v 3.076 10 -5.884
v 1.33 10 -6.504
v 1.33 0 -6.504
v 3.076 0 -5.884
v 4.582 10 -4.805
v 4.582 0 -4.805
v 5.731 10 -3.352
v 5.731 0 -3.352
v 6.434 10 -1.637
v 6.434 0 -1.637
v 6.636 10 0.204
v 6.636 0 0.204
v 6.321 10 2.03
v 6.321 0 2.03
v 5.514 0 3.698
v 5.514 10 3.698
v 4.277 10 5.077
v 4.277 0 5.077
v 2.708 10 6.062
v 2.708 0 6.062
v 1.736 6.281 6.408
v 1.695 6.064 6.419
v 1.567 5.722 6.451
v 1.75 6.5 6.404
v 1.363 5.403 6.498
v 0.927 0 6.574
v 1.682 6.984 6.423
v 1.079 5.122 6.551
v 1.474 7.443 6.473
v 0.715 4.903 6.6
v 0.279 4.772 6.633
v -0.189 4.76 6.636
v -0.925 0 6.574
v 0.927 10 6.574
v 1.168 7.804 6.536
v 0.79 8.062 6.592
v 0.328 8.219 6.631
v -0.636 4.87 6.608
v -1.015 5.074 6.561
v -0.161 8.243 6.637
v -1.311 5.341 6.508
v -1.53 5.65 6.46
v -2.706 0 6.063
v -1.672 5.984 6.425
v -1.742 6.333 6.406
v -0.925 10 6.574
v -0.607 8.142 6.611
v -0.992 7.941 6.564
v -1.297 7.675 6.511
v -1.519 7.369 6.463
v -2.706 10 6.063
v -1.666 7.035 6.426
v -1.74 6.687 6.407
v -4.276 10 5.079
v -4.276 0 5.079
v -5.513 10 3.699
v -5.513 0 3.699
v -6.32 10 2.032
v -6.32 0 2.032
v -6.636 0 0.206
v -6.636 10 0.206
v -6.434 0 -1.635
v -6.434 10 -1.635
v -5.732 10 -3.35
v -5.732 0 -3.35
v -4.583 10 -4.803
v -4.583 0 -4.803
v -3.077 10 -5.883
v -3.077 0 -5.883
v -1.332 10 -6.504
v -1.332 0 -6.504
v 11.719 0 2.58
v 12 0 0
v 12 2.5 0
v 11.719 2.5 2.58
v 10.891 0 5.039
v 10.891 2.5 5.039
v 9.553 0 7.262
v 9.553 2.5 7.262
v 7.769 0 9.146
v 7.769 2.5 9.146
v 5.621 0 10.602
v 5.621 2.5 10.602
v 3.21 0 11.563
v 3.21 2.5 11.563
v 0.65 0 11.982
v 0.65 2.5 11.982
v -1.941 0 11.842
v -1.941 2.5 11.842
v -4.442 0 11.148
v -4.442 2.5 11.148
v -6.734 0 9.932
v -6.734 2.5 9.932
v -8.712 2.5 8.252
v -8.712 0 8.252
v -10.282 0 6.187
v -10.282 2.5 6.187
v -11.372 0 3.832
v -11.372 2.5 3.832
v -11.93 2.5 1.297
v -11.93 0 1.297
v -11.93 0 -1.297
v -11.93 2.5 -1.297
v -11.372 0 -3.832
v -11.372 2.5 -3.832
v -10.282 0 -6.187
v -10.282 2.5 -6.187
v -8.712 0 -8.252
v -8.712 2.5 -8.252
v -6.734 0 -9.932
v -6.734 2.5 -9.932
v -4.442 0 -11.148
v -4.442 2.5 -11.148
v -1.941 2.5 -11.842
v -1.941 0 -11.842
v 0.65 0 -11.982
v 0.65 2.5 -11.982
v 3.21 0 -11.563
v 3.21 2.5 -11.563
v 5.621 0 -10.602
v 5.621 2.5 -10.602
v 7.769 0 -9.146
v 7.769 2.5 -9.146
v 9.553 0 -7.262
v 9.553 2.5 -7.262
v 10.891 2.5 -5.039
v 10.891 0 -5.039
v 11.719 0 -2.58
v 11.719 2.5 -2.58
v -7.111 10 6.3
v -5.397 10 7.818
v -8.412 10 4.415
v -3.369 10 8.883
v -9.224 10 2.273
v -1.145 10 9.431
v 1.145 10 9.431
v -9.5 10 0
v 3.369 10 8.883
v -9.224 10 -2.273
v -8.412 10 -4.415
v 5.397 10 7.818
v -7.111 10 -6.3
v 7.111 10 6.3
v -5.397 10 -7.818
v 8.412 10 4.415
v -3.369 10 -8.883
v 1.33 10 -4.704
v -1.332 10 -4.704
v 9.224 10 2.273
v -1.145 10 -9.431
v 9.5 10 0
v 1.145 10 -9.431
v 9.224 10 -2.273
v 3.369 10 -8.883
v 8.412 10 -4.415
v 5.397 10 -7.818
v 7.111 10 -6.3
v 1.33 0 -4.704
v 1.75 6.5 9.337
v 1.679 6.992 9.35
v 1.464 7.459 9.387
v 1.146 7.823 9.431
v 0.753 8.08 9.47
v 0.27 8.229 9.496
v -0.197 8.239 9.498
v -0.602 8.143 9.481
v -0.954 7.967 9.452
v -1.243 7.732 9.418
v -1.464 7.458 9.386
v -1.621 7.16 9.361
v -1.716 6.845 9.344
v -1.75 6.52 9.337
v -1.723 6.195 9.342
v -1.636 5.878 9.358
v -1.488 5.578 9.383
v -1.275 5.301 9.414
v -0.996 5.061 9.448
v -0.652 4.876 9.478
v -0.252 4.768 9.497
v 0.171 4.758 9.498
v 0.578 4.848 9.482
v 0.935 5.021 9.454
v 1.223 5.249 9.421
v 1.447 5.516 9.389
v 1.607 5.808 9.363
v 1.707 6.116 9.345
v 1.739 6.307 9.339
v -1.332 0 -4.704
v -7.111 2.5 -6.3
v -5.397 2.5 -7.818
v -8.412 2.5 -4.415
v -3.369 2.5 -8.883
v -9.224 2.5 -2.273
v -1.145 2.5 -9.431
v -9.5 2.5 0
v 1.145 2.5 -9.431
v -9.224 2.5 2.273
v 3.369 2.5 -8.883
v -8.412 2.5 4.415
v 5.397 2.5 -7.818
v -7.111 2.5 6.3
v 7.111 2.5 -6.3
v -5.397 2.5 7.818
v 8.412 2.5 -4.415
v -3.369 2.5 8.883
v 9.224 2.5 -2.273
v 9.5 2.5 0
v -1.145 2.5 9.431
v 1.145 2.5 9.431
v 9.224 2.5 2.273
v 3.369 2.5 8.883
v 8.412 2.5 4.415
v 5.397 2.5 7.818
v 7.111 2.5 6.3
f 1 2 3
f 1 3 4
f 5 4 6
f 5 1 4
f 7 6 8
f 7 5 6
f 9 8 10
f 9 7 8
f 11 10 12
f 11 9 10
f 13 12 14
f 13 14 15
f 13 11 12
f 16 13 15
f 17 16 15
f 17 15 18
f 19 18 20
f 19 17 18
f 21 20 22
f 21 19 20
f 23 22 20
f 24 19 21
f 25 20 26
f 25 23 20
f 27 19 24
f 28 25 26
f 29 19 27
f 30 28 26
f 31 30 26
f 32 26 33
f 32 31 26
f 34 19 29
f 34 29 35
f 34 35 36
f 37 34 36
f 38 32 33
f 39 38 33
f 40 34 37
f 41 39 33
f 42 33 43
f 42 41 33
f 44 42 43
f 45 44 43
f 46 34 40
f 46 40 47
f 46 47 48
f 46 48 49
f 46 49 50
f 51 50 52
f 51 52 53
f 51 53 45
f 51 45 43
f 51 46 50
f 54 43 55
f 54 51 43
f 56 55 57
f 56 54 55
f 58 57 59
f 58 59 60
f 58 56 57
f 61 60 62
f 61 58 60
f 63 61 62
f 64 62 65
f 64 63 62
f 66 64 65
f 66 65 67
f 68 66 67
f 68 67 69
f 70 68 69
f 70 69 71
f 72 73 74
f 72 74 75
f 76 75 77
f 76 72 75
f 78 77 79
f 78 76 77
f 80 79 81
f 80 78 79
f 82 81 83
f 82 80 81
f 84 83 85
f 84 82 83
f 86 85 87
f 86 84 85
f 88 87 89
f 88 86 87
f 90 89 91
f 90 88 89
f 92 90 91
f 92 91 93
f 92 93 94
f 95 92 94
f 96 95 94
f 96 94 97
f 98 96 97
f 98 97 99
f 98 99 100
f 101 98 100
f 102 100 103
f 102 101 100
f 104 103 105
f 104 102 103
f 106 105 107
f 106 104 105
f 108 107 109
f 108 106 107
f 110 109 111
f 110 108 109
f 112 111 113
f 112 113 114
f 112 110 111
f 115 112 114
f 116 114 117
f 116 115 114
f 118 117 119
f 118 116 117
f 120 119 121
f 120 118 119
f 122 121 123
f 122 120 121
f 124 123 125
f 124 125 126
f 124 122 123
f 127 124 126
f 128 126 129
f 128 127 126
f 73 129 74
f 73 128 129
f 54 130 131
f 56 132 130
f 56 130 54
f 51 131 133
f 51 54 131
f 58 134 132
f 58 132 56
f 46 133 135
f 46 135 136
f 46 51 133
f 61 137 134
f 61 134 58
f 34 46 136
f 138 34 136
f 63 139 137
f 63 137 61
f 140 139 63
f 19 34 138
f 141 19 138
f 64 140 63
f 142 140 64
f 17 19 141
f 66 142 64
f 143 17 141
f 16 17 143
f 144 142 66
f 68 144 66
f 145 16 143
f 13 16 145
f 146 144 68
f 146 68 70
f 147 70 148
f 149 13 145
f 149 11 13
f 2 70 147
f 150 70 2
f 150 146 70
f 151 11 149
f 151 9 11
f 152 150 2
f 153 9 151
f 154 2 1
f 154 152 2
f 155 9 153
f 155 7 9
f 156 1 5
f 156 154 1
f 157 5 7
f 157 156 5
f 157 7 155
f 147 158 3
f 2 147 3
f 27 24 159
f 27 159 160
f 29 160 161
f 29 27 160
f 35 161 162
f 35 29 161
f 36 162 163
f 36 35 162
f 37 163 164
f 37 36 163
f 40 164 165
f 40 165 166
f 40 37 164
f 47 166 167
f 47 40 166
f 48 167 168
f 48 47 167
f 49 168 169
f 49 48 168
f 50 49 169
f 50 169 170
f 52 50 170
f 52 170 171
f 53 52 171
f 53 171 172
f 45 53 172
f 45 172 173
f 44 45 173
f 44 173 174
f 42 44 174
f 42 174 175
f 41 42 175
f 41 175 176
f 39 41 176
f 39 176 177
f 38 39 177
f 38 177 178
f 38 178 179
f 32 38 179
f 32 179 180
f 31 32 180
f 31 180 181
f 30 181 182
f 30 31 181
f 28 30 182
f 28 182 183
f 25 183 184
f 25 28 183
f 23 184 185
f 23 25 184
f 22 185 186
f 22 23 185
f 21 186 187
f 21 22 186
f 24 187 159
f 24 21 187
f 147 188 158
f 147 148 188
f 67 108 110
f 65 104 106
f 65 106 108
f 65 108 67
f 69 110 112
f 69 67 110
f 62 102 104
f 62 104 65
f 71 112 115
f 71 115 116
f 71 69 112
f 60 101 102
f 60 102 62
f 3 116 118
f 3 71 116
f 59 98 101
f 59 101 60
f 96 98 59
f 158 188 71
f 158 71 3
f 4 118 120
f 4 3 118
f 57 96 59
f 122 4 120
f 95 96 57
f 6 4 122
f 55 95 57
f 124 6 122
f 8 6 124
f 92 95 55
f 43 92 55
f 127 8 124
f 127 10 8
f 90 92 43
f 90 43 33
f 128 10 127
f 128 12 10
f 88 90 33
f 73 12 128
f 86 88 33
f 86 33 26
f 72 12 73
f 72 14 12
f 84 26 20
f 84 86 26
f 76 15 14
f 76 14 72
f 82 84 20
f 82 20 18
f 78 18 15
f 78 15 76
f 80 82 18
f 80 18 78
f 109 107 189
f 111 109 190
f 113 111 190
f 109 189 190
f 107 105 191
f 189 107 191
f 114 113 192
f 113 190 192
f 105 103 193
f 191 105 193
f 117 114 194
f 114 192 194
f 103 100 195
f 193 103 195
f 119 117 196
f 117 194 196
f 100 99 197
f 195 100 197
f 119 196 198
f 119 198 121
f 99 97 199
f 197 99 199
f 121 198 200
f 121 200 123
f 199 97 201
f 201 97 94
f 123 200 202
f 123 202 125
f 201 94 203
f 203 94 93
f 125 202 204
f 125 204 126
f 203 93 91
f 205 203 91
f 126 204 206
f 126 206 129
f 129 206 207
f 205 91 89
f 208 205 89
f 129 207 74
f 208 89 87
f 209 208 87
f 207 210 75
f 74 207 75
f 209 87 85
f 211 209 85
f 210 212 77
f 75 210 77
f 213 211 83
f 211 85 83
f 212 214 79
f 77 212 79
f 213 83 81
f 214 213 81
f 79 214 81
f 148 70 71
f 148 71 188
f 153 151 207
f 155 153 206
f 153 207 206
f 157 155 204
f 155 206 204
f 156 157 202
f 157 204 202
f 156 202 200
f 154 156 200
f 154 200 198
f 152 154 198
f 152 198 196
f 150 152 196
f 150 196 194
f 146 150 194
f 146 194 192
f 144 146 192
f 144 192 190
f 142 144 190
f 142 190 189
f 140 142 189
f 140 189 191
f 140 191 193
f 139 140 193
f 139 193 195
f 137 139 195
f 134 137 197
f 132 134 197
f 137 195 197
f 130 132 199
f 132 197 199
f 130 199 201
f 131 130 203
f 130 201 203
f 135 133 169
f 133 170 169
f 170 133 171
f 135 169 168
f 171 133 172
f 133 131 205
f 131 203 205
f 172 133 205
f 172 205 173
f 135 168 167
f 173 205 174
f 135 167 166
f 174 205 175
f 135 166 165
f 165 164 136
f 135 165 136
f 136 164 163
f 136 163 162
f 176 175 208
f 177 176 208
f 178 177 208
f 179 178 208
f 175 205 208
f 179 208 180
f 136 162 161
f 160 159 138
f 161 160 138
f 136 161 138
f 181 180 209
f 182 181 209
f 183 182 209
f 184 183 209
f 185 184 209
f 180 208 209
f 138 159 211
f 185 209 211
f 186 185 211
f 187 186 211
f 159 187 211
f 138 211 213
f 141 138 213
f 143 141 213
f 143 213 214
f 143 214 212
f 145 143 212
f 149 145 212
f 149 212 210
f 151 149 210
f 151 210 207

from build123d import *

# Parameters (mm, degrees)
SKETCH1_R           = 9.5
BOSS_EXTRUDE1_DEPTH = 10
SKETCH2_R           = 12
BOSS_EXTRUDE2_DEPTH = 2.5
CUT_EXTRUDE2_DEPTH  = 2.5
SKETCH5_R           = 1.75
CUT_EXTRUDE3_DEPTH  = 15


with BuildPart() as part:
    # Sketch1 → Boss-Extrude1 (new body)
    with BuildSketch(Plane(origin=(0, 0, 0), x_dir=(1, 0, 0), z_dir=(0, 1, 0))):
        Circle(SKETCH1_R)
        with BuildLine():
            Line((-1.332, 6.504006227), (-1.332, 4.704006227))
            Line((-1.332, 4.704006227), (1.33, 4.704006227))
            Line((1.33, 4.704006227), (1.33, 6.5044155))
            ThreePointArc((1.33, 6.5044155), (0.001020723, -6.638999922), (-1.332, 6.504006227))
        make_face(mode=Mode.SUBTRACT)
    extrude(amount=BOSS_EXTRUDE1_DEPTH)

    # Sketch2 → Boss-Extrude2 (add)
    with BuildSketch(Plane.XZ):
        Circle(SKETCH2_R)
    extrude(amount=-BOSS_EXTRUDE2_DEPTH)

    # Sketch4 → Cut-Extrude2 (cut)
    with BuildSketch(Plane(origin=(0, 2.5, 0), x_dir=(1, 0, 0), z_dir=(0, 1, 0))):
        with BuildLine():
            Line((-1.332, 4.704006227), (1.33, 4.704006227))
            Line((1.33, 4.704006227), (1.33, 6.5044155))
            ThreePointArc((1.33, 6.5044155), (0.001020723, -6.638999922), (-1.332, 6.504006227))
            Line((-1.332, 6.504006227), (-1.332, 4.704006227))
        make_face()
    extrude(amount=-CUT_EXTRUDE2_DEPTH, mode=Mode.SUBTRACT)

    # Sketch5 → Cut-Extrude3 (cut)
    with BuildSketch(Plane.XY.offset(-4.704006227)):
        with Locations((-0.000110737, 6.499999939)):
            Circle(SKETCH5_R)
    extrude(amount=CUT_EXTRUDE3_DEPTH, mode=Mode.SUBTRACT)


solid = part.part
